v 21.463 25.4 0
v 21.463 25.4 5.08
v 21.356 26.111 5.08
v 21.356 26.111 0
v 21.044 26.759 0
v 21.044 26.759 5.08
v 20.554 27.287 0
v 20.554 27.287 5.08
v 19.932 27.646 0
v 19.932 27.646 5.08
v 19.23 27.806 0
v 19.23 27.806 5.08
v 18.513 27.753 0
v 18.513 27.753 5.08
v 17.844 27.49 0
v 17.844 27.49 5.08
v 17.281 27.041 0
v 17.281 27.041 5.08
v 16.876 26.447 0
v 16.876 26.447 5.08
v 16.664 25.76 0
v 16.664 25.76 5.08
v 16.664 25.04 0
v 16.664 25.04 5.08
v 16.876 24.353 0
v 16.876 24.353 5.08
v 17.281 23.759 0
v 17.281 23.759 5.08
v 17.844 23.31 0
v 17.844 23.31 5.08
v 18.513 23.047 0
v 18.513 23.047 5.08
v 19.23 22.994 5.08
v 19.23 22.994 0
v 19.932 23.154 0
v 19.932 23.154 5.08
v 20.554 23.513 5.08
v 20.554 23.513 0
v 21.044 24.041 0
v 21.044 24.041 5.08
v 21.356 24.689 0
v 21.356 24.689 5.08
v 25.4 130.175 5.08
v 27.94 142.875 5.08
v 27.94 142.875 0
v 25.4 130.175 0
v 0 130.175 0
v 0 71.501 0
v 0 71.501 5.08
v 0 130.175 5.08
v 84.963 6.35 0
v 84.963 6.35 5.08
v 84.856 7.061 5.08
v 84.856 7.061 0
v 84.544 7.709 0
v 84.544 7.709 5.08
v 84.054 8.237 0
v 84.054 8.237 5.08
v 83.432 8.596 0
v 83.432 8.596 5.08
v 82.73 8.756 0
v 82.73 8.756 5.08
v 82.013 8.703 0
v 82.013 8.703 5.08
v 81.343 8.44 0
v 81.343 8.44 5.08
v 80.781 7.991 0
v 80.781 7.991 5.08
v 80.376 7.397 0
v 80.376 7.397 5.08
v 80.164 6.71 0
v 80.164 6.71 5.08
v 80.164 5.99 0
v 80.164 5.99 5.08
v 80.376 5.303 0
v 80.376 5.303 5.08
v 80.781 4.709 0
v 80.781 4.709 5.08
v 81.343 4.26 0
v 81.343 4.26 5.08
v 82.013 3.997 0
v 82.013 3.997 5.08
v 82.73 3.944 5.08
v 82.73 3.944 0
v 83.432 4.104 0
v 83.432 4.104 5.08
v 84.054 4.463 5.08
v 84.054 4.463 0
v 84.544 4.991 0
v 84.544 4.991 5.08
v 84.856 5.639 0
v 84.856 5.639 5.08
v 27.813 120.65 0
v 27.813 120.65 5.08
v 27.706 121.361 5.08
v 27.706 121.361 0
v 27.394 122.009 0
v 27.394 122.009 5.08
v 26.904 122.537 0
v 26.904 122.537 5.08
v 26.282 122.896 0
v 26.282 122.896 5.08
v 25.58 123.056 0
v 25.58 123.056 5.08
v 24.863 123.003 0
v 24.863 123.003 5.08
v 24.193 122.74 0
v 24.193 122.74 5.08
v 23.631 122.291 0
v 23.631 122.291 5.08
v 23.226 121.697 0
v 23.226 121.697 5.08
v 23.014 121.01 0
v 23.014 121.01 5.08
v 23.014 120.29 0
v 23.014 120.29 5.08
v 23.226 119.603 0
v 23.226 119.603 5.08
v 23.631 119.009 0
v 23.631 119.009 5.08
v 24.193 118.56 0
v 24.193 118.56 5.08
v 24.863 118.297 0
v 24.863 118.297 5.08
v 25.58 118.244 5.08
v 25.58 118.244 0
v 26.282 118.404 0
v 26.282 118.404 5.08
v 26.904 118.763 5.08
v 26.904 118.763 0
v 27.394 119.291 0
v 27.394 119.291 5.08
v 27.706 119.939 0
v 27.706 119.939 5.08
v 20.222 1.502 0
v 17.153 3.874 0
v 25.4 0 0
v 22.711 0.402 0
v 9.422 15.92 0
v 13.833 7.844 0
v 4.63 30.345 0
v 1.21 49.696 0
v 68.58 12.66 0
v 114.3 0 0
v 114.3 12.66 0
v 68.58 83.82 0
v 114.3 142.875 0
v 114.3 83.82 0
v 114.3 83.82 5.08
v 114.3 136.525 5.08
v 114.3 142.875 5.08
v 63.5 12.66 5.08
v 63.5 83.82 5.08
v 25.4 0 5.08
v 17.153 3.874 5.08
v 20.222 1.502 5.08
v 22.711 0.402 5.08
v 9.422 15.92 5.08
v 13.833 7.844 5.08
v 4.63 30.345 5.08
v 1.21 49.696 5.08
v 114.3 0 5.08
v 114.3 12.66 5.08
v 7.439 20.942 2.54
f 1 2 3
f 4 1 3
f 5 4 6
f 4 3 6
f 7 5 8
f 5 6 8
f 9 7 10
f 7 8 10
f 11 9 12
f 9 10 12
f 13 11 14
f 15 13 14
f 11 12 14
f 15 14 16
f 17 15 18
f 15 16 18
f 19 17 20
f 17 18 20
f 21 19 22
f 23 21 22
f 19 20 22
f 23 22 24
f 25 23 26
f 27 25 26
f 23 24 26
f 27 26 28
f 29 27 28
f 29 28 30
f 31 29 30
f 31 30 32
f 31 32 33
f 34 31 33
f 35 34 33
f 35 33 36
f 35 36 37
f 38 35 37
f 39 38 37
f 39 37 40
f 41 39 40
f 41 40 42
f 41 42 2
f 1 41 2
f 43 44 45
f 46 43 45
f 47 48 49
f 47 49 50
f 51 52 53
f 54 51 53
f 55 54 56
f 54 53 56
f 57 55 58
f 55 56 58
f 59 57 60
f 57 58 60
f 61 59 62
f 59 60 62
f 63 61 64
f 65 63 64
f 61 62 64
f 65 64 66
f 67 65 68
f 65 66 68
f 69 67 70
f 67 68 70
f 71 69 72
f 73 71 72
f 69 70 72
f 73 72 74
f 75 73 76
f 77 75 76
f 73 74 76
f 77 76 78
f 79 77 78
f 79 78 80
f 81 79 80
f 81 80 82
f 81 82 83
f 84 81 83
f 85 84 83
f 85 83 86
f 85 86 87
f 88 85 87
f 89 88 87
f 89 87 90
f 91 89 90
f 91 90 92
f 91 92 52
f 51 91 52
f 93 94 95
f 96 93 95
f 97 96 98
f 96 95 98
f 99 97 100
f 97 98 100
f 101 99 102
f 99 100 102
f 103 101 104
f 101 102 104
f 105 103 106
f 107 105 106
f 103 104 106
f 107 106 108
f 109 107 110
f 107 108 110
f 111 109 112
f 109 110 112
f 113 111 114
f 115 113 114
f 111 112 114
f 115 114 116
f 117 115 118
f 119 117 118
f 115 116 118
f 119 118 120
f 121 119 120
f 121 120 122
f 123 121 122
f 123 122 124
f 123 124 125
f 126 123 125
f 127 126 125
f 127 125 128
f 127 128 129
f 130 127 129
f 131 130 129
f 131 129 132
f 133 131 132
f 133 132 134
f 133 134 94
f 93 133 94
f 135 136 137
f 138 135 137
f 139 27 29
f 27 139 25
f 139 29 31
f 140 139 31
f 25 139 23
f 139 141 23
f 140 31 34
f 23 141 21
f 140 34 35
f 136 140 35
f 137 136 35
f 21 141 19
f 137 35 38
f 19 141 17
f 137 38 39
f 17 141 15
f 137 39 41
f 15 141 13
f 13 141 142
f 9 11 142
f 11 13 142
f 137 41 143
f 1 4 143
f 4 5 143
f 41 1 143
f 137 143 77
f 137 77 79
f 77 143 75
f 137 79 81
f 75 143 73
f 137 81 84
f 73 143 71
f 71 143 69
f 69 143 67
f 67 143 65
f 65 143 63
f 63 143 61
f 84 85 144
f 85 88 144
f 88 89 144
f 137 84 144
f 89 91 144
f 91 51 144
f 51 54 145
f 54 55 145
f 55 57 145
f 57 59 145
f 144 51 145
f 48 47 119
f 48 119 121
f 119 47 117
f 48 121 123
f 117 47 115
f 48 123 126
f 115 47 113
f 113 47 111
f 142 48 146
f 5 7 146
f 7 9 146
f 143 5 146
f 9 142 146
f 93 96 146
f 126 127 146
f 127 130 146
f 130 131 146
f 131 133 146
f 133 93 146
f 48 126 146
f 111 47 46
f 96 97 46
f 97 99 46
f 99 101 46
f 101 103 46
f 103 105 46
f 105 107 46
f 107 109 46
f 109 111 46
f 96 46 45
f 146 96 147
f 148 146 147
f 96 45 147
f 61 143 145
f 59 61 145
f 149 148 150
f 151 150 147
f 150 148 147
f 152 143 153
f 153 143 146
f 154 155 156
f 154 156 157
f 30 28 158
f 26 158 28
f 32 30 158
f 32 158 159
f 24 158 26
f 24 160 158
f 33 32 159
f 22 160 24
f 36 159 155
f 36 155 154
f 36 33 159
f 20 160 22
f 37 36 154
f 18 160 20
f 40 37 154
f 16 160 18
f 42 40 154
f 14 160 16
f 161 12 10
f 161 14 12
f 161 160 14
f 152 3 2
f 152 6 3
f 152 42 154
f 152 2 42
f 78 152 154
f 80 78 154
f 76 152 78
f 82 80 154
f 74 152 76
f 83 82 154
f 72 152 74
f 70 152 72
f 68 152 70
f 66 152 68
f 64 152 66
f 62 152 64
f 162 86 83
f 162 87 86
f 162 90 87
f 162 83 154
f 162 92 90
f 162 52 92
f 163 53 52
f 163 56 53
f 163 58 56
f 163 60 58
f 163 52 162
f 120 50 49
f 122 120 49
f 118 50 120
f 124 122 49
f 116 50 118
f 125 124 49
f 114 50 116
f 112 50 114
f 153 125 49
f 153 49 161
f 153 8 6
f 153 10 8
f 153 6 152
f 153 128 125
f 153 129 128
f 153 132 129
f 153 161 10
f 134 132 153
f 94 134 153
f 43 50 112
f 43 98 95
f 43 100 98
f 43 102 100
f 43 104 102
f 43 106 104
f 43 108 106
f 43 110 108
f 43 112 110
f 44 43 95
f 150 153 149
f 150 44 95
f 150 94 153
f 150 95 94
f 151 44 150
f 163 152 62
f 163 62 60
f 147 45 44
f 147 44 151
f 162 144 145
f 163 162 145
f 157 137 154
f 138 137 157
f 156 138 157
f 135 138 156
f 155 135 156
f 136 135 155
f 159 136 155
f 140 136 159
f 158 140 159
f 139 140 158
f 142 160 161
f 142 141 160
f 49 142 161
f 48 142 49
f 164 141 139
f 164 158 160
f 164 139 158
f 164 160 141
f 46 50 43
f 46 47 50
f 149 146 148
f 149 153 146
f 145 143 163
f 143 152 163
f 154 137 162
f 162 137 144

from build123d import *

# Parameters (mm, degrees)
SKETCH2_W                      = 114.3
SKETCH2_H                      = 142.875
BOSS_EXTRUDE2_DEPTH            = 30.48
FILLET1_SIZE                   = 25.4
FILLET1_SIZE_2                 = 71.501
BOSS_EXTRUDE3_DEPTH            = 11.43
CUT_EXTRUDE2_DEPTH             = 25.4
FILLET2_R                      = 1.27
SKETCH7_W                      = 27.94
SKETCH7_H                      = 30.48
CUT_EXTRUDE4_DEPTH             = 12.7
BOSS_EXTRUDE4_DEPTH            = 11.43
CUT_EXTRUDE6_DEPTH             = 25.4
CUT_EXTRUDE7_DEPTH             = 171.262283535
CUT_EXTRUDE7_DEPTH_BACK        = 171.262283535
SKETCH11_R                     = 3.175
CUT_EXTRUDE8_REACH             = 185.225
SKETCH12_R                     = 3.175
CUT_EXTRUDE8_DIRECTION_2_DEPTH = 184.224735996
CHAMFER1_SIZE2                 = 12.7
CHAMFER1_SIZE                  = 2.54
SKETCH13_W                     = 7.62
SKETCH13_H                     = 5.08
CUT_EXTRUDE9_DEPTH             = 25.4
FILLET4_R                      = 1.27
CUT_EXTRUDE10_DEPTH            = 195.431359314
CHAMFER2_SIZE                  = 12.7
CUT_EXTRUDE11_REACH            = 196.431
SKETCH15_R                     = 3.175
BOSS_EXTRUDE5_DEPTH            = 1.27
CHAMFER3_SIZE                  = 1.27
BOSS_EXTRUDE6_DEPTH            = 1.27
CHAMFER4_SIZE                  = 1.27
FILLET5_R                      = 15.24
CUT_EXTRUDE12_DEPTH            = 16.51
SKETCH20_W                     = 2.54
SKETCH20_H                     = 2.54
CUT_EXTRUDE13_DEPTH            = 171.777226453
FILLET6_R                      = 1.27
CUT_EXTRUDE14_DEPTH            = 1.27
CUT_EXTRUDE14_DEPTH_BACK       = 1.27
SKETCH21_W                     = 5.08
SKETCH21_H                     = 33.02
SKETCH21_H_2                   = 10.329873089
SKETCH21_H_3                   = 10.221702335
SKETCH21_W_2                   = 7.62
SKETCH21_H_4                   = 1.402013576
SKETCH21_W_3                   = 1.485233779
FILLET7_R                      = 11.43
SKETCH22_R                     = 1.27
CUT_EXTRUDE15_DEPTH            = 12.7
SKETCH24_W                     = 120.524481761
SKETCH24_H                     = 158.415517923
CUT_EXTRUDE17_DEPTH            = 25.4
SKETCH25_W                     = 45.72
SKETCH25_H                     = 71.15970777
CUT_EXTRUDE18_DEPTH            = 184.039782773
CHAMFER5_SIZE                  = 5.08
SKETCH27_R                     = 2.413
CUT_EXTRUDE20_DEPTH            = 184.039782773


# Some blends are built 0.0001 mm under size
with BuildPart() as part:
    # Sketch2 → Boss-Extrude2 (new body)
    with BuildSketch(Plane.XY):
        with Locations((57.15, 71.4375)):
            Rectangle(SKETCH2_W, SKETCH2_H)
    extrude(amount=BOSS_EXTRUDE2_DEPTH)

    # Fillet1
    # an asymmetric fillet: 71.501, 25.4 mm, written as the material it takes off along each edge
    with BuildSketch(Plane(origin=(0, 0, -178.7525), x_dir=(1, 0, 0), z_dir=(0, 0, 1))) as fillet1_piece_1:
        with BuildLine():
            Bezier((FILLET1_SIZE, 0), (0, 0), (0, FILLET1_SIZE_2), weights=[1, 0.707106781, 1])
            Line((0, FILLET1_SIZE_2), (0, 0))
            Line((0, 0), (FILLET1_SIZE, 0))
        make_face()
    extrude(amount=387.985, mode=Mode.SUBTRACT)

    # Sketch3 → Boss-Extrude3 (add)
    with BuildSketch(Plane(origin=(0, 142.875, 0), x_dir=(1, 0, 0), z_dir=(0, 1, 0))):
        with BuildLine():
            Line((33.866582, -7.62), (33.866582, -27.94))
            ThreePointArc((33.866582, -27.94), (28.786582, -17.78), (33.866582, -7.62))
        make_face()
        with BuildLine():
            Line((49.106582, -7.62), (49.106582, -27.94))
            ThreePointArc((49.106582, -27.94), (54.186582, -17.78), (49.106582, -7.62))
        make_face()
    extrude(amount=BOSS_EXTRUDE3_DEPTH)

    # Sketch5 → Cut-Extrude2 (cut)
    with BuildSketch(Plane.XY.offset(30.48)):
        with BuildLine():
            Line((62.653333333, 142.875), (77.893333333, 142.875))
            ThreePointArc((77.893333333, 142.875), (70.273333333, 119.729689625), (62.653333333, 142.875))
        make_face()
        with BuildLine():
            Line((91.44, 142.875), (106.68, 142.875))
            ThreePointArc((106.68, 142.875), (99.06, 119.729689625), (91.44, 142.875))
        make_face()
    extrude(amount=-CUT_EXTRUDE2_DEPTH, mode=Mode.SUBTRACT)

    # Fillet2
    fillet2_edges = [part.edges().sort_by_distance(p)[0] for p in [
        (77.893333333, 142.875, 17.78),
        (62.653333333, 142.875, 17.78),
        (91.44, 142.875, 17.78),
    ]]
    fillet(fillet2_edges, radius=FILLET2_R)

    # Sketch7 → Cut-Extrude4 (cut)
    with BuildSketch(Plane(origin=(0, 142.875, 0), x_dir=(1, 0, 0), z_dir=(0, 1, 0))):
        with Locations((13.97, -15.24)):
            Rectangle(SKETCH7_W, SKETCH7_H)
    extrude(amount=-CUT_EXTRUDE4_DEPTH, mode=Mode.SUBTRACT)

    # Sketch8 → Boss-Extrude4 (add)
    with BuildSketch(Plane(origin=(0, 130.175, 0), x_dir=(1, 0, 0), z_dir=(0, 1, 0))):
        with BuildLine():
            Line((5.08, -7.62), (5.08, -27.94))
            ThreePointArc((5.08, -27.94), (0, -17.78), (5.08, -7.62))
        make_face()
        with BuildLine():
            Line((20.32, -7.62), (20.32, -27.94))
            ThreePointArc((20.32, -27.94), (25.4, -17.78), (20.32, -7.62))
        make_face()
    extrude(amount=BOSS_EXTRUDE4_DEPTH)

    # Sketch10 → Cut-Extrude6 (cut)
    with BuildSketch(Plane.XY.offset(30.48)):
        Polygon((63.5, 109.855), (12.7, 109.855), (12.7, 61.2775), (38.1, 12.7), (63.5, 12.7), (63.5, 94.615), (106.68, 94.615), (106.68, 109.855), align=None)
    extrude(amount=-CUT_EXTRUDE6_DEPTH, mode=Mode.SUBTRACT)

    # Sketch11 → Cut-Extrude7 (cut, two sides: drawn at the far end of the back side and taken through both)
    with BuildSketch(Plane.ZY.offset(-49.106582).offset(-CUT_EXTRUDE7_DEPTH_BACK)):
        with Locations((17.78, 149.225)):
            Circle(SKETCH11_R)
        with BuildLine():
            Line((22.044917923, 151.984868677), (27.94, 142.875))
            Line((27.94, 142.875), (27.94, 154.305))
            Line((27.94, 154.305), (17.78, 154.305))
            ThreePointArc((17.78, 154.305), (20.207577715, 153.687428312), (22.044917923, 151.984868677))
        make_face()
    extrude(amount=CUT_EXTRUDE7_DEPTH + CUT_EXTRUDE7_DEPTH_BACK, mode=Mode.SUBTRACT)

    # Cut-Extrude8: up to this face of the body (flat: up to its plane)
    cut_extrude8_end = Plane(part.part.faces().sort_by_distance((27.94, 136.525, 15.24))[0])
    # Sketch12 → Cut-Extrude8 (cut, up to the picked face)
    with BuildSketch(Plane.ZY.offset(-20.32), mode=Mode.PRIVATE) as cut_extrude8_sk1:
        with Locations((17.78, 136.525)):
            Circle(SKETCH12_R)
    cut_extrude8_tool1 = split(extrude(cut_extrude8_sk1.sketch, amount=-CUT_EXTRUDE8_REACH, mode=Mode.PRIVATE), bisect_by=cut_extrude8_end, keep=Keep.BOTH, mode=Mode.PRIVATE)
    # Sketch12 → Cut-Extrude8 (cut, up to the picked face)
    with BuildSketch(Plane.ZY.offset(-20.32), mode=Mode.PRIVATE) as cut_extrude8_sk2:
        with BuildLine():
            Line((22.044917923, 139.284868677), (27.94, 130.175))
            Line((27.94, 130.175), (27.94, 141.605))
            Line((27.94, 141.605), (17.78, 141.605))
            ThreePointArc((17.78, 141.605), (20.207577715, 140.987428312), (22.044917923, 139.284868677))
        make_face()
    cut_extrude8_tool2 = split(extrude(cut_extrude8_sk2.sketch, amount=-CUT_EXTRUDE8_REACH, mode=Mode.PRIVATE), bisect_by=cut_extrude8_end, keep=Keep.BOTH, mode=Mode.PRIVATE)
    add(cut_extrude8_tool1.solids().sort_by(Axis((20.32, 136.525, 17.78), (1, 0, 0)))[0], mode=Mode.SUBTRACT)
    add(cut_extrude8_tool2.solids().sort_by(Axis((20.32, 137.885407, 25.333291), (1, 0, 0)))[0], mode=Mode.SUBTRACT)

    # Sketch12 → Cut-Extrude8 direction 2 (cut)
    with BuildSketch(Plane.ZY.offset(-20.32)):
        with Locations((17.78, 136.525)):
            Circle(SKETCH12_R)
        with BuildLine():
            Line((22.044917923, 139.284868677), (27.94, 130.175))
            Line((27.94, 130.175), (27.94, 141.605))
            Line((27.94, 141.605), (17.78, 141.605))
            ThreePointArc((17.78, 141.605), (20.207577715, 140.987428312), (22.044917923, 139.284868677))
        make_face()
    extrude(amount=CUT_EXTRUDE8_DIRECTION_2_DEPTH, mode=Mode.SUBTRACT)

    # Chamfer1
    chamfer1_edges = [part.edges().sort_by_distance(p)[0] for p in [
        (27.94, 130.175, 15.24),
    ]]
    chamfer1_side = [part.faces().sort_by_distance(p)[0] for p in [
        (27.8892, 130.175, 15.24),
    ]]
    chamfer(chamfer1_edges, length=CHAMFER1_SIZE - 0.0001, length2=CHAMFER1_SIZE2 - 0.0001, reference=chamfer1_side[0])  # a hair under: the kernel refuses the full size

    # Sketch13 → Cut-Extrude9 (cut)
    with BuildSketch(Plane.XY.offset(30.48)):
        with Locations((110.49, 140.335)):
            Rectangle(SKETCH13_W, SKETCH13_H)
    extrude(amount=-CUT_EXTRUDE9_DEPTH, mode=Mode.SUBTRACT)

    # Fillet4
    fillet4_edges = [part.edges().sort_by_distance(p)[0] for p in [
        (110.768630723, 137.795, 17.78),
        (114.3, 137.795, 17.78),
    ]]
    fillet(fillet4_edges, radius=FILLET4_R)

    # Sketch14 → Cut-Extrude10 (cut, through all)
    with BuildSketch(Plane.XY.offset(30.48)):
        Polygon((114.3, 12.7), (81.28, 12.7), (81.28, 26.67), (111.76, 26.67), (111.76, 69.85), (81.28, 69.85), (81.28, 83.82), (114.3, 83.82), align=None)
    extrude(amount=-CUT_EXTRUDE10_DEPTH, mode=Mode.SUBTRACT)

    # Chamfer2
    chamfer2_edges = [part.edges().sort_by_distance(p)[0] for p in [
        (81.28, 76.835, 30.48),
        (81.28, 19.685, 30.48),
    ]]
    chamfer(chamfer2_edges, length=CHAMFER2_SIZE)

    # Cut-Extrude11: up to this face of the body (flat: up to its plane)
    cut_extrude11_end = Plane(part.part.faces().sort_by_distance((59.69, 109.855, 17.78))[0])
    # Sketch15 → Cut-Extrude11 (cut, up to the picked face)
    with BuildSketch(Plane.XZ, mode=Mode.PRIVATE) as cut_extrude11_sk1:
        with Locations(Location((99.06, 17.78, 0), (0, 0, 270))):
            Circle(SKETCH15_R)
    cut_extrude11_tool1 = split(extrude(cut_extrude11_sk1.sketch, amount=-CUT_EXTRUDE11_REACH, mode=Mode.PRIVATE), bisect_by=cut_extrude11_end, keep=Keep.BOTH, mode=Mode.PRIVATE)
    add(cut_extrude11_tool1.solids().sort_by(Axis((99.06, 0, 17.78), (0, 1, 0)))[0], mode=Mode.SUBTRACT)

    # Sketch16 → Boss-Extrude5 (add)
    with BuildSketch(Plane(origin=(0, 141.605, 0), x_dir=(1, 0, 0), z_dir=(0, 1, 0))):
        with BuildLine():
            Line((0.406992957, -14.590646171), (5.08, -14.605))
            Line((5.08, -14.605), (5.08, -7.62))
            ThreePointArc((5.08, -7.62), (2.151092977, -10.708185479), (0.406992957, -14.590646171))
        make_face()
        with BuildLine():
            Line((20.32, -14.605), (24.996722124, -14.605))
            ThreePointArc((24.996722124, -14.605), (23.253033275, -10.714344425), (20.32, -7.62))
            Line((20.32, -7.62), (20.32, -14.605))
        make_face()
    extrude(amount=BOSS_EXTRUDE5_DEPTH)

    # Chamfer3
    chamfer3_edges = [part.edges().sort_by_distance(p)[0] for p in [
        (22.658361062, 142.875, 14.605),
        (2.743496479, 142.875, 14.597823086),
    ]]
    chamfer(chamfer3_edges, length=CHAMFER3_SIZE - 0.0001)  # a hair under: the kernel refuses the full size

    # Sketch17 → Boss-Extrude6 (add)
    with BuildSketch(Plane(origin=(0, 154.305, 0), x_dir=(1, 0, 0), z_dir=(0, 1, 0))):
        with BuildLine():
            Line((29.150536334, -14.761394806), (33.866582, -14.761394806))
            Line((33.866582, -14.761394806), (33.866582, -7.62))
            ThreePointArc((33.866582, -7.62), (30.888902084, -10.781487273), (29.150536334, -14.761394806))
        make_face()
        with BuildLine():
            Line((49.106582, -14.761394806), (53.822627666, -14.761394806))
            ThreePointArc((53.822627666, -14.761394806), (52.084261916, -10.781487273), (49.106582, -7.62))
            Line((49.106582, -7.62), (49.106582, -14.761394806))
        make_face()
    extrude(amount=BOSS_EXTRUDE6_DEPTH)

    # Chamfer4
    chamfer4_edges = [part.edges().sort_by_distance(p)[0] for p in [
        (51.464604833, 155.575, 14.761394806),
        (31.508559167, 155.575, 14.761394806),
    ]]
    chamfer(chamfer4_edges, length=CHAMFER4_SIZE - 0.0001)  # a hair under: the kernel refuses the full size

    # Fillet5
    fillet5_edges = [part.edges().sort_by_distance(p)[0] for p in [
        (111.76, 48.26, 30.48),
    ]]
    fillet(fillet5_edges, radius=FILLET5_R)

    # Sketch19 → Cut-Extrude12 (cut)
    with BuildSketch(Plane.XY.offset(30.48)):
        Polygon((81.28, 52.07), (111.76, 52.07), (111.76, 57.15), (81.28, 57.15), (69.85, 57.15), (69.85, 52.07), align=None)
    extrude(amount=-CUT_EXTRUDE12_DEPTH, mode=Mode.SUBTRACT)

    # Sketch20 → Cut-Extrude13 (cut, through all)
    with BuildSketch(Plane.ZY.offset(-63.5)):
        with Locations((19.05, 39.37)):
            Rectangle(SKETCH20_W, SKETCH20_H)
    extrude(amount=-CUT_EXTRUDE13_DEPTH, mode=Mode.SUBTRACT)

    # Fillet6
    fillet6_edges = [part.edges().sort_by_distance(p)[0] for p in [
        (63.5, 38.1, 19.05),
    ]]
    fillet(fillet6_edges, radius=FILLET6_R)

    # Sketch21 → Cut-Extrude14 (cut, two sides: drawn at the far end of the back side and taken through both)
    with BuildSketch(Plane.XY.offset(17.78).offset(-CUT_EXTRUDE14_DEPTH_BACK)):
        Polygon((12.7, 109.855), (10.485930724, 130.175), (15.565930724, 130.175), (17.78, 109.855), align=None)
        Polygon((55.429725371, 142.875), (50.86041281, 121.653709764), (50.86041281, 109.855), (52.449738918, 109.855), (52.449738918, 121.653709764), (57.019051479, 142.875), align=None)
        with Locations((41.486582, 126.365)):
            Rectangle(SKETCH21_W, SKETCH21_H)
        with Locations((69.426582, 115.019936545)):
            Rectangle(SKETCH21_W, SKETCH21_H_2)
        with Locations((98.636582, 114.965851168)):
            Rectangle(SKETCH21_W, SKETCH21_H_3)
        with Locations((110.49, 102.445426643)):
            Rectangle(SKETCH21_W_2, SKETCH21_H_4)
        with Locations((84.636338767, 126.365)):
            Rectangle(SKETCH21_W_3, SKETCH21_H)
    extrude(amount=CUT_EXTRUDE14_DEPTH + CUT_EXTRUDE14_DEPTH_BACK, mode=Mode.SUBTRACT)

    # Fillet7
    fillet7_edges = [part.edges().sort_by_distance(p)[0] for p in [
        (63.5, 94.615, 17.78),
    ]]
    fillet(fillet7_edges, radius=FILLET7_R)

    # Sketch22 → Cut-Extrude15 (cut)
    with BuildSketch(Plane(origin=(0, 12.7, 0), x_dir=(1, 0, 0), z_dir=(0, 1, 0))):
        with Locations(Location((43.18, -11.908276952, 0), (0, 0, 180))):
            Circle(SKETCH22_R)
        with Locations(Location((48.26, -11.908276952, 0), (0, 0, 180))):
            Circle(SKETCH22_R)
        with Locations(Location((53.34, -11.908276952, 0), (0, 0, 180))):
            Circle(SKETCH22_R)
        with Locations(Location((58.42, -11.908276952, 0), (0, 0, 180))):
            Circle(SKETCH22_R)
        with Locations(Location((43.18, -22.068276952, 0), (0, 0, 180))):
            Circle(SKETCH22_R)
        with Locations(Location((48.26, -22.068276952, 0), (0, 0, 180))):
            Circle(SKETCH22_R)
        with Locations(Location((53.34, -22.068276952, 0), (0, 0, 180))):
            Circle(SKETCH22_R)
        with Locations(Location((58.42, -22.068276952, 0), (0, 0, 180))):
            Circle(SKETCH22_R)
    extrude(amount=-CUT_EXTRUDE15_DEPTH, mode=Mode.SUBTRACT)

    # Sketch24 → Cut-Extrude17 (cut)
    with BuildSketch(Plane.XY.offset(30.48)):
        with Locations((54.03775912, 79.207758962)):
            Rectangle(SKETCH24_W, SKETCH24_H)
    extrude(amount=-CUT_EXTRUDE17_DEPTH, mode=Mode.SUBTRACT)

    # Sketch25 → Cut-Extrude18 (cut, through all)
    with BuildSketch(Plane.XY.offset(5.08)):
        with Locations((91.44, 48.240146115)):
            Rectangle(SKETCH25_W, SKETCH25_H)
    extrude(amount=-CUT_EXTRUDE18_DEPTH, mode=Mode.SUBTRACT)

    # Chamfer5
    chamfer5_edges = [part.edges().sort_by_distance(p)[0] for p in [
        (68.58, 48.240146115, 5.08),
    ]]
    chamfer(chamfer5_edges, length=CHAMFER5_SIZE - 0.0001)  # a hair under: the kernel refuses the full size

    # Sketch27 → Cut-Extrude20 (cut, through all)
    with BuildSketch(Plane.XY.offset(5.08)):
        with Locations((25.4, 120.65)):
            Circle(SKETCH27_R)
        with Locations((19.05, 25.4)):
            Circle(SKETCH27_R)
        with Locations((82.55, 6.35)):
            Circle(SKETCH27_R)
    extrude(amount=-CUT_EXTRUDE20_DEPTH, mode=Mode.SUBTRACT)


solid = part.part
